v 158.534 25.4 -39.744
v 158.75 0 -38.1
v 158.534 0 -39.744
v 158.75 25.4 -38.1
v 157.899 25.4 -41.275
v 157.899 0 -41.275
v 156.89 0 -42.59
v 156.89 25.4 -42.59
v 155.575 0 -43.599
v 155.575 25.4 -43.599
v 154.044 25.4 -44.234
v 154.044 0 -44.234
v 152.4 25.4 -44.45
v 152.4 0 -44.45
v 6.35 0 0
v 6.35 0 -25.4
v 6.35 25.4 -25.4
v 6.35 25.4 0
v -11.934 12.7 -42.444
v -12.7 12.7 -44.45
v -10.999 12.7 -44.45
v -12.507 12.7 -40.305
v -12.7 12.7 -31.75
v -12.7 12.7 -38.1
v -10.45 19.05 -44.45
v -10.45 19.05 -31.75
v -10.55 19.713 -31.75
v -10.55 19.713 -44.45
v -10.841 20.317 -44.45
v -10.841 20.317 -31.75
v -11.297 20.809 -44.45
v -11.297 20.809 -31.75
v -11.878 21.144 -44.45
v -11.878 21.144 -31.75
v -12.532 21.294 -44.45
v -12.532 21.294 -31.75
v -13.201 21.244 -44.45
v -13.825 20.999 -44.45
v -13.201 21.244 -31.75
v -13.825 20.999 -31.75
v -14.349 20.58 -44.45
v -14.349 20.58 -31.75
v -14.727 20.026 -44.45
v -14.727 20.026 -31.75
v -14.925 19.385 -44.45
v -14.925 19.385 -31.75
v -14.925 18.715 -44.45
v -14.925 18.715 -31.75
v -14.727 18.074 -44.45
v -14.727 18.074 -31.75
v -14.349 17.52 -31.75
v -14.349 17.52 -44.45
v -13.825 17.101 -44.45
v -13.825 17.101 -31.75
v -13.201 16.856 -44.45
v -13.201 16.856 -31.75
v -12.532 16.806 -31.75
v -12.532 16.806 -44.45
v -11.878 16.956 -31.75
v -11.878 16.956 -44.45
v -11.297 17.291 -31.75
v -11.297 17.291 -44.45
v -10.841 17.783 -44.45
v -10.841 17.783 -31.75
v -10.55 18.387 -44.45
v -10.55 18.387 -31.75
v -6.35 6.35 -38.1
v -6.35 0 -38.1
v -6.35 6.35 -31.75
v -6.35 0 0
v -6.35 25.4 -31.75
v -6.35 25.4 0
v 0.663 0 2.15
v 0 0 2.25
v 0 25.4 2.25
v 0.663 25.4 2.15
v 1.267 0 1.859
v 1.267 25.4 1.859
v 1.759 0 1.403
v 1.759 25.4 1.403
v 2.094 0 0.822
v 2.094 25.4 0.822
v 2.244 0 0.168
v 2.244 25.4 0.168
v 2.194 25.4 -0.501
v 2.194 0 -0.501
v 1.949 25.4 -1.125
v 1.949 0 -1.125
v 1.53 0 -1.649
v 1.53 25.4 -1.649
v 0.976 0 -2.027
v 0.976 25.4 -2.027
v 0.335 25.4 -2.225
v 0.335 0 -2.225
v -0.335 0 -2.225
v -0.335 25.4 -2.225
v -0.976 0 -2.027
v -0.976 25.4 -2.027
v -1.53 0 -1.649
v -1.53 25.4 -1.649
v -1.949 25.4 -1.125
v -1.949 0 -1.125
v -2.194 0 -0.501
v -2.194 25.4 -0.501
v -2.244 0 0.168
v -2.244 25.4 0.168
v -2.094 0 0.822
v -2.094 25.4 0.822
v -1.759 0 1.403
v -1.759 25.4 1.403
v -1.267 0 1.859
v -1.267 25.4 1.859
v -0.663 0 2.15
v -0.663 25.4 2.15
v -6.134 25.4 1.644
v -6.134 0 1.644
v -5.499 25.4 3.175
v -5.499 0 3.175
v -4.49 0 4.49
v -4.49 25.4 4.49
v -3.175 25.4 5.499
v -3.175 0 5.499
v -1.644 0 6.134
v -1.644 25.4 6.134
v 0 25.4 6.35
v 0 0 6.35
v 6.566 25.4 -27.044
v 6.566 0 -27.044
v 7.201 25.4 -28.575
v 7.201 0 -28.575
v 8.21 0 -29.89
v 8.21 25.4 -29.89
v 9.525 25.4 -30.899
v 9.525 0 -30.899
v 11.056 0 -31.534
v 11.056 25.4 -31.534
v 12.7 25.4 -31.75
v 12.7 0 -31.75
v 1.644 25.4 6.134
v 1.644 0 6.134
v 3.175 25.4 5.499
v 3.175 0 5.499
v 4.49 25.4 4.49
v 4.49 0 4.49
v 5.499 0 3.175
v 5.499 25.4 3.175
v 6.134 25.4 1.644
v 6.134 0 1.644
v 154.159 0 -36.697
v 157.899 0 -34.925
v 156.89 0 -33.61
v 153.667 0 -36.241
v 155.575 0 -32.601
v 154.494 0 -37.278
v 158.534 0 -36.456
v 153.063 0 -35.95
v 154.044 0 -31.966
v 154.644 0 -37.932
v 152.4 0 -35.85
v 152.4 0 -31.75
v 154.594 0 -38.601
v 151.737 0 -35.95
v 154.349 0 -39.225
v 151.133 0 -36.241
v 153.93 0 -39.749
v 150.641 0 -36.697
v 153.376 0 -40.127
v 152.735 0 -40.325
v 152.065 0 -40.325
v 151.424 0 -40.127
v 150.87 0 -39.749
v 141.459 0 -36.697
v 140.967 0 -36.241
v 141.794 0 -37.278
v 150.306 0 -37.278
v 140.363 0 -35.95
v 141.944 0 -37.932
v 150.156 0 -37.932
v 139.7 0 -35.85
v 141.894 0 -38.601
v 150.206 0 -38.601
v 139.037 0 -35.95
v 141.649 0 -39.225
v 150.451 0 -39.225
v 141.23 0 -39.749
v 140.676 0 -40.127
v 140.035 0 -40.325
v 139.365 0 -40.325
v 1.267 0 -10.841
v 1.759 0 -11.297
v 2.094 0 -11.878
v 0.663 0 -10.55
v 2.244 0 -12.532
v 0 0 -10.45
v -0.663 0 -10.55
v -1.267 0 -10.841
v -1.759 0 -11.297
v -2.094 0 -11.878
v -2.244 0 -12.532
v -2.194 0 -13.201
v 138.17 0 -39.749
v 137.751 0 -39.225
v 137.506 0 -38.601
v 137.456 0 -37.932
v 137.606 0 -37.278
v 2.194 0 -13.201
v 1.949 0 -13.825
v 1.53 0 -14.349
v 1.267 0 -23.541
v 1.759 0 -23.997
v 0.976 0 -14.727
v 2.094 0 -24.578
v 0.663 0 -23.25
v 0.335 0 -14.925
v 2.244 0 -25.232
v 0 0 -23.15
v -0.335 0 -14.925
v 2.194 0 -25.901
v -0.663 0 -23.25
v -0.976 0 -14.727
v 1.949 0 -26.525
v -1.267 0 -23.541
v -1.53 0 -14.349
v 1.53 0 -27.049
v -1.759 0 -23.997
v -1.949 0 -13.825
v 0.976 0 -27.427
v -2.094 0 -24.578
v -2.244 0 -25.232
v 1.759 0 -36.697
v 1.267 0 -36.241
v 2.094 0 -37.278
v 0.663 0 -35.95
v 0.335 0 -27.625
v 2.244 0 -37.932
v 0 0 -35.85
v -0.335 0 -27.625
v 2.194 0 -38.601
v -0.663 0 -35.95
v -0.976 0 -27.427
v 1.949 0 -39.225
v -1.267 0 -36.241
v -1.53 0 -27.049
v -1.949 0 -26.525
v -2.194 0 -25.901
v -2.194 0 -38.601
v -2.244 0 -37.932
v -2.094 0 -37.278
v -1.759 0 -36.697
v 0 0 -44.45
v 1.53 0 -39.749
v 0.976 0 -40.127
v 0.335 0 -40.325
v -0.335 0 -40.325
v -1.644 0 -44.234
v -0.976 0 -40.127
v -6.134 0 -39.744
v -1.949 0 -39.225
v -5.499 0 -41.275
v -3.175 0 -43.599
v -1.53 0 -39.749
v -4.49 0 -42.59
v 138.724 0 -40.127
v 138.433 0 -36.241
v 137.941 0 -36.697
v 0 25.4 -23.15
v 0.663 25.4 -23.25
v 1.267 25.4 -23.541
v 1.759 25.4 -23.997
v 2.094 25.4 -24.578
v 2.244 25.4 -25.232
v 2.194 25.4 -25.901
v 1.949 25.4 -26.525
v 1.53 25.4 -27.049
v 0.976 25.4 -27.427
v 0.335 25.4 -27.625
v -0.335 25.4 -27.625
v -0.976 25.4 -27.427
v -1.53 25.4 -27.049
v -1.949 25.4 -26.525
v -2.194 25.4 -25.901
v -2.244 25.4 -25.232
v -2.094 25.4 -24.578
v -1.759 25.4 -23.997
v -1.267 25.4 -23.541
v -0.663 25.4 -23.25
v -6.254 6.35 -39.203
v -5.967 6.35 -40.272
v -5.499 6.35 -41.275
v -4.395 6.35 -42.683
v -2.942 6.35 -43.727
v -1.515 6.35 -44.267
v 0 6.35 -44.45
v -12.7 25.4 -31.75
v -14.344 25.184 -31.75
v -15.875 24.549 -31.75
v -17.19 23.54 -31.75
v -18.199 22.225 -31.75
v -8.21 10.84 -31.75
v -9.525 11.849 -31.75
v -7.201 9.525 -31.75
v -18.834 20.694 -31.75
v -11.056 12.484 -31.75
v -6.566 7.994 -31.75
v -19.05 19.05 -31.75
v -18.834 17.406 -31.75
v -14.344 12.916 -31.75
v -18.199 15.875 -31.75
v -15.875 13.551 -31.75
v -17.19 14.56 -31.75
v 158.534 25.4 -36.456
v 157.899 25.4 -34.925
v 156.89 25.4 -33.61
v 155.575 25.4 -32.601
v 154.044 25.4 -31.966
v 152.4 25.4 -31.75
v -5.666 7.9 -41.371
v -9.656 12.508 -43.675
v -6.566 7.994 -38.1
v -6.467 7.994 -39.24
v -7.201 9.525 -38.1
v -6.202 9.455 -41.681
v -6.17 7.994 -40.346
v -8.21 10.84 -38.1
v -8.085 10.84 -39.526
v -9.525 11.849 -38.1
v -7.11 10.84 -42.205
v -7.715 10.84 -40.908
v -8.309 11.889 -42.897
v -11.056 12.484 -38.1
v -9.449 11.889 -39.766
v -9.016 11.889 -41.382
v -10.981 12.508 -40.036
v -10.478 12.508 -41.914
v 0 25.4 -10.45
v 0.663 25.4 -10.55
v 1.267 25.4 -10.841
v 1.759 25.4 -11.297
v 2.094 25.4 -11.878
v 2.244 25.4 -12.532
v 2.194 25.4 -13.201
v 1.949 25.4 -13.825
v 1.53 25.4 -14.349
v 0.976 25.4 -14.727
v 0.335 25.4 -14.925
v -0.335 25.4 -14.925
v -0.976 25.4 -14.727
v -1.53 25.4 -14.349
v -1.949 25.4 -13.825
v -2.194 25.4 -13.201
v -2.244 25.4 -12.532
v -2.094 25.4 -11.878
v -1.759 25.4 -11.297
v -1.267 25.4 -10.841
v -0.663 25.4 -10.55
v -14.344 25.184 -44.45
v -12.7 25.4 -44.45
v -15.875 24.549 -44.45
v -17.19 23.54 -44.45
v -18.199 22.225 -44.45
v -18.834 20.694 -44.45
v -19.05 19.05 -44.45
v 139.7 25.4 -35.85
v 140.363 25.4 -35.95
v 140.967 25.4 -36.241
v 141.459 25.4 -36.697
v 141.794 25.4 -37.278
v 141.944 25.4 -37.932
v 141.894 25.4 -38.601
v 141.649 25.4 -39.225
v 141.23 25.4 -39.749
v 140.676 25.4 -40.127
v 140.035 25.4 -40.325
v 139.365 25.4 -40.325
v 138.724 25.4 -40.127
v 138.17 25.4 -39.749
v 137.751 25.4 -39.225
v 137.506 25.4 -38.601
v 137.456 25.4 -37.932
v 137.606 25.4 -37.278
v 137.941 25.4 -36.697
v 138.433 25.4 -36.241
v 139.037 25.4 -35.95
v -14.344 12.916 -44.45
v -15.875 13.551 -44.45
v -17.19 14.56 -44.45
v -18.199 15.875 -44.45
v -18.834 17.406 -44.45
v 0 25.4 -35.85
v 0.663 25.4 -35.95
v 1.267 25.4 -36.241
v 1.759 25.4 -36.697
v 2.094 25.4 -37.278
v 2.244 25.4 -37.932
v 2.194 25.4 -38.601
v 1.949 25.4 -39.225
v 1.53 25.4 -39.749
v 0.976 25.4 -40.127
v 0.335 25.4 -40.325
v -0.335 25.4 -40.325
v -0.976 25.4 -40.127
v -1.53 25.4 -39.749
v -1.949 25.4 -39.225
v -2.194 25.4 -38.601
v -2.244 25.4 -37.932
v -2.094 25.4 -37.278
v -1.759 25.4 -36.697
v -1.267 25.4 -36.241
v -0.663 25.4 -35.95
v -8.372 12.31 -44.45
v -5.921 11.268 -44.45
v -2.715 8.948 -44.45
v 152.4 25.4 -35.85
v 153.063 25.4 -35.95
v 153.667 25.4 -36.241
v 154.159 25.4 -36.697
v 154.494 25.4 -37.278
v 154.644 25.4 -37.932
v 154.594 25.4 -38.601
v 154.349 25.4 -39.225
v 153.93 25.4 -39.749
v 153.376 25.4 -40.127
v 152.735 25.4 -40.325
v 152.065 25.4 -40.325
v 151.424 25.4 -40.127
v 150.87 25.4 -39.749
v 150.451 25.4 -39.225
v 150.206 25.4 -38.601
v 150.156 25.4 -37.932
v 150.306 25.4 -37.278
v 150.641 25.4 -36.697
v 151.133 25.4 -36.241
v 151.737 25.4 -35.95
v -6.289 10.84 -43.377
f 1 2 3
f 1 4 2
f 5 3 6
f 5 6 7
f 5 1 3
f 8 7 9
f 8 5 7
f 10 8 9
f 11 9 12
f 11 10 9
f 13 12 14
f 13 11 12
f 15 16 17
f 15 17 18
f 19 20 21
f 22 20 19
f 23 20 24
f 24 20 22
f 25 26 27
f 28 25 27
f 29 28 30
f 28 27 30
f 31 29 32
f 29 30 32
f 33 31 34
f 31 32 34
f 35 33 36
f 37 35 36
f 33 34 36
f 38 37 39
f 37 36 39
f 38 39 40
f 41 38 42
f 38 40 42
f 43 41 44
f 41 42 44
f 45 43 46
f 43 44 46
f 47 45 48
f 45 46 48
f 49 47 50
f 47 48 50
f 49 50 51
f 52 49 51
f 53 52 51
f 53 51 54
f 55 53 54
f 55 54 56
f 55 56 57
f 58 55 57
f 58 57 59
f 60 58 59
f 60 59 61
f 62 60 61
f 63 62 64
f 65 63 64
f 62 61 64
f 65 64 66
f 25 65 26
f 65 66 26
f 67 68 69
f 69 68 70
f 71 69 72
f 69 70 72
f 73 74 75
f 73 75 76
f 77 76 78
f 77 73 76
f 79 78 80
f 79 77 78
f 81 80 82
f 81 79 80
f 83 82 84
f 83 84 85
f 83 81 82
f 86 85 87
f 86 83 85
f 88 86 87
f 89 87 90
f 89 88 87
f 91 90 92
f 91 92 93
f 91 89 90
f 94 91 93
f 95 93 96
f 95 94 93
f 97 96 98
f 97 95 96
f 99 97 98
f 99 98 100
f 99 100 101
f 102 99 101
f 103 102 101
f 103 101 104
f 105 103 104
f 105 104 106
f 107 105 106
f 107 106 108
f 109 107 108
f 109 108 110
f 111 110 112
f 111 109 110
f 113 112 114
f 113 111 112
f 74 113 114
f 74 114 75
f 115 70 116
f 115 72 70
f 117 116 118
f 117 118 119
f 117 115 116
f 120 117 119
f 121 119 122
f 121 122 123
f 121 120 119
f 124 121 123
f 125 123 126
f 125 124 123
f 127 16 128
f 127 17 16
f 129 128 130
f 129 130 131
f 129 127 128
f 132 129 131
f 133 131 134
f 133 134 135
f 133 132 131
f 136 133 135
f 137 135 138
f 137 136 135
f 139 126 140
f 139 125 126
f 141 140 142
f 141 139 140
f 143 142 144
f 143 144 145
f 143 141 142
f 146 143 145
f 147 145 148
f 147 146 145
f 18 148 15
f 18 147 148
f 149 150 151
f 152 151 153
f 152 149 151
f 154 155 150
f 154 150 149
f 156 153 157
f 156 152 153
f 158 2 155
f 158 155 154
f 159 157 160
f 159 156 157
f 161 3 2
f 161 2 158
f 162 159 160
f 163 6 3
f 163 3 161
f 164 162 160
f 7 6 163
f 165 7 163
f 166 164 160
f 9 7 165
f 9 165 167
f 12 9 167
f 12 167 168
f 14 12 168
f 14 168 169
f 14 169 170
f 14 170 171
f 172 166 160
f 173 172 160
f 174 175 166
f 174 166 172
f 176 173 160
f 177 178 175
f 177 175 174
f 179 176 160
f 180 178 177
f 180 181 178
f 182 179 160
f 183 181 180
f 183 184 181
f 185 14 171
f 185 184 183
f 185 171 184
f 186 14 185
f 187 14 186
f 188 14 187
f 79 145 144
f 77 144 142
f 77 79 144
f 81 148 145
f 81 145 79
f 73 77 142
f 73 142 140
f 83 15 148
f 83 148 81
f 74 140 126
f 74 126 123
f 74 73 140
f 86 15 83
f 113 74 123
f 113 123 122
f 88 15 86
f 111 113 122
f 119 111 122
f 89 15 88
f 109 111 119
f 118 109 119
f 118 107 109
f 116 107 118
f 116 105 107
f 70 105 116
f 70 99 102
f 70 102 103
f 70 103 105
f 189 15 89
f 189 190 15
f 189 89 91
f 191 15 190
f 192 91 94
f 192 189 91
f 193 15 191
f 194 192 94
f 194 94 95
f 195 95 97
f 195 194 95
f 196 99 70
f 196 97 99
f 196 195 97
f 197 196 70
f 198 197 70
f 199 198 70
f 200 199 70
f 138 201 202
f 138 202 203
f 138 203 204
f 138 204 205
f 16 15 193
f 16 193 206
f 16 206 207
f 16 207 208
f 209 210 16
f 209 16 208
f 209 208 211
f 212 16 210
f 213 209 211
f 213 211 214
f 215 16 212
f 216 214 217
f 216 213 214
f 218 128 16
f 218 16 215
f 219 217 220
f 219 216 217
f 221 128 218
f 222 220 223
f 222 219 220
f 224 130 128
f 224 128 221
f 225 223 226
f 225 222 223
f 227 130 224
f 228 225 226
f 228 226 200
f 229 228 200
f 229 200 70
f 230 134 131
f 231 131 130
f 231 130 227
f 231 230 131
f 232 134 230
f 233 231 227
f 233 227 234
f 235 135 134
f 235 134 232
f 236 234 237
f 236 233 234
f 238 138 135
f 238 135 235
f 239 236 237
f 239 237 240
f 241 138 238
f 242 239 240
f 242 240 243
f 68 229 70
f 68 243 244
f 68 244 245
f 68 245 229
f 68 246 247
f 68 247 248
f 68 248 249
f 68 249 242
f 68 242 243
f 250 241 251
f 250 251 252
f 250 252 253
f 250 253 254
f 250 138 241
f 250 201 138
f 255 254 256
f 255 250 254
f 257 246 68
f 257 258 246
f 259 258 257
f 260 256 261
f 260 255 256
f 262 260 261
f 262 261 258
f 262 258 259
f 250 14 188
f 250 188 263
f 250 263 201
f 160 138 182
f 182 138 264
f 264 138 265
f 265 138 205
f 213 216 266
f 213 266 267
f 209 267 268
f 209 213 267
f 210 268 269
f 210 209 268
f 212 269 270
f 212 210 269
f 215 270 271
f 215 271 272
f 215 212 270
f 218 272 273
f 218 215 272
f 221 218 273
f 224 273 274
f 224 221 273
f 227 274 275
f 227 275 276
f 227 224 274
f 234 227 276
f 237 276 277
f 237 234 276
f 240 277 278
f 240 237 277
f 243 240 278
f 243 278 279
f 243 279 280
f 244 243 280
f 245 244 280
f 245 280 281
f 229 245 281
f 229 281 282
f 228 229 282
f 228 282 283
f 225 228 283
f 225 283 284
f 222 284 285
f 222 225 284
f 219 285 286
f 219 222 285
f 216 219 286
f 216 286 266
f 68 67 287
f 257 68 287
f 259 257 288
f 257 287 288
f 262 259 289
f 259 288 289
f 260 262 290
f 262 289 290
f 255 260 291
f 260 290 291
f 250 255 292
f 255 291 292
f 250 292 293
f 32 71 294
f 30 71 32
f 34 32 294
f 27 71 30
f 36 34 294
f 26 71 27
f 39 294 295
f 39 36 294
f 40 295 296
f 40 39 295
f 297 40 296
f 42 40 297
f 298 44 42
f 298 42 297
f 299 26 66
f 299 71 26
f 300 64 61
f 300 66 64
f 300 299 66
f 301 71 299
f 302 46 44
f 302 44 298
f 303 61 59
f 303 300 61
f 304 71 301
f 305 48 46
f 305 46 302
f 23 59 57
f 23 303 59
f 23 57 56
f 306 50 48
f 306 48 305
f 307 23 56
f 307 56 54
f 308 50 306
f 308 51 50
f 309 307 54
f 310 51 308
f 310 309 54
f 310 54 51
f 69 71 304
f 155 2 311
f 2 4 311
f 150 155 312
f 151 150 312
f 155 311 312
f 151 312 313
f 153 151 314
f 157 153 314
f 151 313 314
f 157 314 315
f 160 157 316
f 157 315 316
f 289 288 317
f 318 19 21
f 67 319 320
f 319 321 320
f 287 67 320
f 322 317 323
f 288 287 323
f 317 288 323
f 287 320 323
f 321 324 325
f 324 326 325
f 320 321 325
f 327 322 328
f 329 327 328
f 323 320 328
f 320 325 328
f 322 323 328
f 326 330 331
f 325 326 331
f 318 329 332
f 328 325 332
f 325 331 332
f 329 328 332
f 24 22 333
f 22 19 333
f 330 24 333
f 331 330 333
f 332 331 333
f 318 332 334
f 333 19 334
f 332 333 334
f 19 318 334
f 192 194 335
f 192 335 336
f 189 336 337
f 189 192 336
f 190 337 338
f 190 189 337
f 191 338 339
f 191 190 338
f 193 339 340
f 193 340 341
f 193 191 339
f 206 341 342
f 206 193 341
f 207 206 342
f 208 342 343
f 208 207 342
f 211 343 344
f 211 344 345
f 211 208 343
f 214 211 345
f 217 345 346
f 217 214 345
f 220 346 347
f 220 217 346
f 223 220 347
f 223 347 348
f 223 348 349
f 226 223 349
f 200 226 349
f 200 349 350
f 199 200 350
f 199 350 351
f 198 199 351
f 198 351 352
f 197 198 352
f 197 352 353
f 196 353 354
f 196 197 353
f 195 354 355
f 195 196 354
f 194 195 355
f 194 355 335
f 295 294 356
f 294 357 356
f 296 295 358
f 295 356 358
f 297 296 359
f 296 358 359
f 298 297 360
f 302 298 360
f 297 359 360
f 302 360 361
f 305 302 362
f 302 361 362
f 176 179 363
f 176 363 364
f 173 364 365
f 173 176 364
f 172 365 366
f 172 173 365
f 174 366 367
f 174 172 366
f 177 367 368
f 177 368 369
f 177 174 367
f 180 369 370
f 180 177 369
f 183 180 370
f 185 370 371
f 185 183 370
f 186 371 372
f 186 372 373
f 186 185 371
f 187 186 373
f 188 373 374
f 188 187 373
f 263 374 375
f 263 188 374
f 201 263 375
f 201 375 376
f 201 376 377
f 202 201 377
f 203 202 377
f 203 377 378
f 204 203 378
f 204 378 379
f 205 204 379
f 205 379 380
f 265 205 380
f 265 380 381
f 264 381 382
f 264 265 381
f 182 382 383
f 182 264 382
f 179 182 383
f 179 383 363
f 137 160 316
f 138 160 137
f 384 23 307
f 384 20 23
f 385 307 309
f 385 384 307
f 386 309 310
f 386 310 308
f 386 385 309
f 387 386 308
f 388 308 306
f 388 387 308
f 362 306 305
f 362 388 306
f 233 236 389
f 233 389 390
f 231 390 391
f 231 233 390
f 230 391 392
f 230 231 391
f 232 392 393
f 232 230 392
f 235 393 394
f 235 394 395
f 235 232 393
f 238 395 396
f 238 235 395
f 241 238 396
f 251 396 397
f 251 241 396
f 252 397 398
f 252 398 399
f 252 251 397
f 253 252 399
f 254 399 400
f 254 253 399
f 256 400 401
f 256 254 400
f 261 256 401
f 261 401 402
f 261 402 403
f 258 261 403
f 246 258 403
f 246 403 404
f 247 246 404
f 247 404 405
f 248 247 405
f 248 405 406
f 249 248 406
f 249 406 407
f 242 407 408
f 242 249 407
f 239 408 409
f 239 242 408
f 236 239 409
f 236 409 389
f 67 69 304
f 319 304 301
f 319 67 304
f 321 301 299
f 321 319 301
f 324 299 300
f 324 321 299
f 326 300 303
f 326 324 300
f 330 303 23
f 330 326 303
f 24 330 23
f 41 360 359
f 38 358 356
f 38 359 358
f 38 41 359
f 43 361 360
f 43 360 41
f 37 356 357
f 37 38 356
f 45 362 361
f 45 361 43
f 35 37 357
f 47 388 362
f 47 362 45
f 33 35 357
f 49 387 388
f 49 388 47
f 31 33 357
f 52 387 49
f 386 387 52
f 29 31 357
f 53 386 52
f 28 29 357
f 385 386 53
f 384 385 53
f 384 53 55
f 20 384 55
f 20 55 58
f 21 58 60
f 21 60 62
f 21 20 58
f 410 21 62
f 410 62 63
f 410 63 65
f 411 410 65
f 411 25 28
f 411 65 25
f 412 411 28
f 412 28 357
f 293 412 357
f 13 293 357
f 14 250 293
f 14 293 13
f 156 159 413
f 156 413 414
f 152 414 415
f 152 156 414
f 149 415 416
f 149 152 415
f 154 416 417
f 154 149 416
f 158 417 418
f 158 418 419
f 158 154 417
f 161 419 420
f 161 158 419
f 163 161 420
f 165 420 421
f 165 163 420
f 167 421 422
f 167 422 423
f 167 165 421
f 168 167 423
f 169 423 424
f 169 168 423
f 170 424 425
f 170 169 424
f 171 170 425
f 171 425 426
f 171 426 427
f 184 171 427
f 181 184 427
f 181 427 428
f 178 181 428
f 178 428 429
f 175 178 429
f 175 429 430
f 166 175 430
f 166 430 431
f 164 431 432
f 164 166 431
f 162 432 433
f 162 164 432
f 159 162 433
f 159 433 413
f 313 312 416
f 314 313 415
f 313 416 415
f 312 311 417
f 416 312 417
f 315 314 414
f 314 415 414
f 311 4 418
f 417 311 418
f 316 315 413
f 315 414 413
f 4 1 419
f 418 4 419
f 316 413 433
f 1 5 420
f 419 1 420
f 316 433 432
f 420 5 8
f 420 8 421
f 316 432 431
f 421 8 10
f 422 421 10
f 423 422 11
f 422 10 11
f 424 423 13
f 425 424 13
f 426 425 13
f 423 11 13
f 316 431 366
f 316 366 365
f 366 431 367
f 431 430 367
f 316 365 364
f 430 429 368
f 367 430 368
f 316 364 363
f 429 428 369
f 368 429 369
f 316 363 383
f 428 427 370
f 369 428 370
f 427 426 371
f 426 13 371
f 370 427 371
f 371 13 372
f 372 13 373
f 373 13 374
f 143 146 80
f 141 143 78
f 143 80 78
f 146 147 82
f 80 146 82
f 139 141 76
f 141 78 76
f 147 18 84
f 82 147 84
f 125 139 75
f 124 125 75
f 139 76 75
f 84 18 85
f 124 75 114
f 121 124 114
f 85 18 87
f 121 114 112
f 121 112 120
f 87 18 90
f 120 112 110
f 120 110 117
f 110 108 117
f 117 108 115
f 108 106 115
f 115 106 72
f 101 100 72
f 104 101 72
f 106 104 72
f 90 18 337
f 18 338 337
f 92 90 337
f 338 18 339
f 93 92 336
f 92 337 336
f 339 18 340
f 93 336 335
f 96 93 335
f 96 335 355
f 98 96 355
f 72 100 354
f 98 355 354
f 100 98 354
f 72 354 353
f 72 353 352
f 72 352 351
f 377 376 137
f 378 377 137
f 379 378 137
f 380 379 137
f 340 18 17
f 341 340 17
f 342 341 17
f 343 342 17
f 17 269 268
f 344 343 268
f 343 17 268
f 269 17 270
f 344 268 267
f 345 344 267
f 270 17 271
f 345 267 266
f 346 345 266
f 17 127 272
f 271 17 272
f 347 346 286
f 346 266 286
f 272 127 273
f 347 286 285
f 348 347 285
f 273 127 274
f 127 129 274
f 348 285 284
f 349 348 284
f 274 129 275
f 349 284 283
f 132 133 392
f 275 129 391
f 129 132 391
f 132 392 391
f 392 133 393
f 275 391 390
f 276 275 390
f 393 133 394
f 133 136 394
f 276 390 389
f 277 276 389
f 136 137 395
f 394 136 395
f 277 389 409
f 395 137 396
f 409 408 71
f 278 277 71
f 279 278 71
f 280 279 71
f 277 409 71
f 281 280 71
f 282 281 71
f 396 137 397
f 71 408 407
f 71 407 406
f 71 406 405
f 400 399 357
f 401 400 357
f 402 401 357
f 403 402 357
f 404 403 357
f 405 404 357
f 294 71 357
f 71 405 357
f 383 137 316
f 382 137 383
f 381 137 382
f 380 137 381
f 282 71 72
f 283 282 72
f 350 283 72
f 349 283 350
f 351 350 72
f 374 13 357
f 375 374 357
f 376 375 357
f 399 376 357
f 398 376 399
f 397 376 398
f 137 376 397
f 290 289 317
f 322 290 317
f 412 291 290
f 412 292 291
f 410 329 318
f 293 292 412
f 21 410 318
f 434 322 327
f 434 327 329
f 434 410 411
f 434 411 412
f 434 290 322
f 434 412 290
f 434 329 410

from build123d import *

# Parameters (mm, degrees)
SKETCH1_R           = 2.25
BOSS_EXTRUDE1_DEPTH = 25.4
SKETCH2_R           = 2.25
SKETCH2_W           = 12.7
SKETCH2_H           = 12.7
CUT_EXTRUDE1_DEPTH  = 12.7
FILLET1_R           = 6.35
FILLET2_R           = 6.35


with BuildPart() as part:
    # Sketch1 → Boss-Extrude1 (new body)
    with BuildSketch(Plane(origin=(0, 0, 0), x_dir=(1, 0, 0), z_dir=(0, 1, 0))):
        Polygon((158.75, 44.45), (158.75, 31.75), (6.35, 31.75), (6.35, -6.35), (-6.35, -6.35), (-6.35, 31.75), (-19.05, 31.75), (-19.05, 44.45), align=None)
        with Locations(Location((0, 38.1, 0), (0, 0, 270))):
            Circle(SKETCH1_R, mode=Mode.SUBTRACT)
        with Locations(Location((152.4, 38.1, 0), (0, 0, 270))):
            Circle(SKETCH1_R, mode=Mode.SUBTRACT)
        with Locations(Location((139.7, 38.1, 0), (0, 0, 270))):
            Circle(SKETCH1_R, mode=Mode.SUBTRACT)
        with Locations(Location((0, 25.4, 0), (0, 0, 270))):
            Circle(SKETCH1_R, mode=Mode.SUBTRACT)
        with Locations(Location((0, 12.7, 0), (0, 0, 270))):
            Circle(SKETCH1_R, mode=Mode.SUBTRACT)
        with Locations(Location((0, 0, 0), (0, 0, 270))):
            Circle(SKETCH1_R, mode=Mode.SUBTRACT)
    extrude(amount=BOSS_EXTRUDE1_DEPTH)

    # Sketch2 → Cut-Extrude1 (cut)
    with BuildSketch(Plane.XY.offset(-31.75)):
        with Locations((-12.7, 19.05)):
            Circle(SKETCH2_R)
        with Locations((-12.7, 6.35)):
            Rectangle(SKETCH2_W, SKETCH2_H)
    extrude(amount=-CUT_EXTRUDE1_DEPTH, mode=Mode.SUBTRACT)

    # Fillet1
    fillet1_edges = [part.edges().sort_by_distance(p)[0] for p in [
        (158.75, 12.7, -44.45),
        (158.75, 12.7, -31.75),
        (6.35, 12.7, 6.35),
        (-6.35, 12.7, 6.35),
        (-6.35, 6.35, -44.45),
        (6.35, 12.7, -31.75),
        (-19.05, 12.7, -38.1),
        (-19.05, 25.4, -38.1),
    ]]
    fillet(fillet1_edges, radius=FILLET1_R - 0.0001)  # a hair under: the kernel refuses the full size

    # Fillet2
    fillet2_edges = [part.edges().sort_by_distance(p)[0] for p in [
        (-4.49015735, 12.7, -42.59015735),
        (-6.35, 12.7, -34.92505),
    ]]
    fillet(fillet2_edges, radius=FILLET2_R)


solid = part.part
